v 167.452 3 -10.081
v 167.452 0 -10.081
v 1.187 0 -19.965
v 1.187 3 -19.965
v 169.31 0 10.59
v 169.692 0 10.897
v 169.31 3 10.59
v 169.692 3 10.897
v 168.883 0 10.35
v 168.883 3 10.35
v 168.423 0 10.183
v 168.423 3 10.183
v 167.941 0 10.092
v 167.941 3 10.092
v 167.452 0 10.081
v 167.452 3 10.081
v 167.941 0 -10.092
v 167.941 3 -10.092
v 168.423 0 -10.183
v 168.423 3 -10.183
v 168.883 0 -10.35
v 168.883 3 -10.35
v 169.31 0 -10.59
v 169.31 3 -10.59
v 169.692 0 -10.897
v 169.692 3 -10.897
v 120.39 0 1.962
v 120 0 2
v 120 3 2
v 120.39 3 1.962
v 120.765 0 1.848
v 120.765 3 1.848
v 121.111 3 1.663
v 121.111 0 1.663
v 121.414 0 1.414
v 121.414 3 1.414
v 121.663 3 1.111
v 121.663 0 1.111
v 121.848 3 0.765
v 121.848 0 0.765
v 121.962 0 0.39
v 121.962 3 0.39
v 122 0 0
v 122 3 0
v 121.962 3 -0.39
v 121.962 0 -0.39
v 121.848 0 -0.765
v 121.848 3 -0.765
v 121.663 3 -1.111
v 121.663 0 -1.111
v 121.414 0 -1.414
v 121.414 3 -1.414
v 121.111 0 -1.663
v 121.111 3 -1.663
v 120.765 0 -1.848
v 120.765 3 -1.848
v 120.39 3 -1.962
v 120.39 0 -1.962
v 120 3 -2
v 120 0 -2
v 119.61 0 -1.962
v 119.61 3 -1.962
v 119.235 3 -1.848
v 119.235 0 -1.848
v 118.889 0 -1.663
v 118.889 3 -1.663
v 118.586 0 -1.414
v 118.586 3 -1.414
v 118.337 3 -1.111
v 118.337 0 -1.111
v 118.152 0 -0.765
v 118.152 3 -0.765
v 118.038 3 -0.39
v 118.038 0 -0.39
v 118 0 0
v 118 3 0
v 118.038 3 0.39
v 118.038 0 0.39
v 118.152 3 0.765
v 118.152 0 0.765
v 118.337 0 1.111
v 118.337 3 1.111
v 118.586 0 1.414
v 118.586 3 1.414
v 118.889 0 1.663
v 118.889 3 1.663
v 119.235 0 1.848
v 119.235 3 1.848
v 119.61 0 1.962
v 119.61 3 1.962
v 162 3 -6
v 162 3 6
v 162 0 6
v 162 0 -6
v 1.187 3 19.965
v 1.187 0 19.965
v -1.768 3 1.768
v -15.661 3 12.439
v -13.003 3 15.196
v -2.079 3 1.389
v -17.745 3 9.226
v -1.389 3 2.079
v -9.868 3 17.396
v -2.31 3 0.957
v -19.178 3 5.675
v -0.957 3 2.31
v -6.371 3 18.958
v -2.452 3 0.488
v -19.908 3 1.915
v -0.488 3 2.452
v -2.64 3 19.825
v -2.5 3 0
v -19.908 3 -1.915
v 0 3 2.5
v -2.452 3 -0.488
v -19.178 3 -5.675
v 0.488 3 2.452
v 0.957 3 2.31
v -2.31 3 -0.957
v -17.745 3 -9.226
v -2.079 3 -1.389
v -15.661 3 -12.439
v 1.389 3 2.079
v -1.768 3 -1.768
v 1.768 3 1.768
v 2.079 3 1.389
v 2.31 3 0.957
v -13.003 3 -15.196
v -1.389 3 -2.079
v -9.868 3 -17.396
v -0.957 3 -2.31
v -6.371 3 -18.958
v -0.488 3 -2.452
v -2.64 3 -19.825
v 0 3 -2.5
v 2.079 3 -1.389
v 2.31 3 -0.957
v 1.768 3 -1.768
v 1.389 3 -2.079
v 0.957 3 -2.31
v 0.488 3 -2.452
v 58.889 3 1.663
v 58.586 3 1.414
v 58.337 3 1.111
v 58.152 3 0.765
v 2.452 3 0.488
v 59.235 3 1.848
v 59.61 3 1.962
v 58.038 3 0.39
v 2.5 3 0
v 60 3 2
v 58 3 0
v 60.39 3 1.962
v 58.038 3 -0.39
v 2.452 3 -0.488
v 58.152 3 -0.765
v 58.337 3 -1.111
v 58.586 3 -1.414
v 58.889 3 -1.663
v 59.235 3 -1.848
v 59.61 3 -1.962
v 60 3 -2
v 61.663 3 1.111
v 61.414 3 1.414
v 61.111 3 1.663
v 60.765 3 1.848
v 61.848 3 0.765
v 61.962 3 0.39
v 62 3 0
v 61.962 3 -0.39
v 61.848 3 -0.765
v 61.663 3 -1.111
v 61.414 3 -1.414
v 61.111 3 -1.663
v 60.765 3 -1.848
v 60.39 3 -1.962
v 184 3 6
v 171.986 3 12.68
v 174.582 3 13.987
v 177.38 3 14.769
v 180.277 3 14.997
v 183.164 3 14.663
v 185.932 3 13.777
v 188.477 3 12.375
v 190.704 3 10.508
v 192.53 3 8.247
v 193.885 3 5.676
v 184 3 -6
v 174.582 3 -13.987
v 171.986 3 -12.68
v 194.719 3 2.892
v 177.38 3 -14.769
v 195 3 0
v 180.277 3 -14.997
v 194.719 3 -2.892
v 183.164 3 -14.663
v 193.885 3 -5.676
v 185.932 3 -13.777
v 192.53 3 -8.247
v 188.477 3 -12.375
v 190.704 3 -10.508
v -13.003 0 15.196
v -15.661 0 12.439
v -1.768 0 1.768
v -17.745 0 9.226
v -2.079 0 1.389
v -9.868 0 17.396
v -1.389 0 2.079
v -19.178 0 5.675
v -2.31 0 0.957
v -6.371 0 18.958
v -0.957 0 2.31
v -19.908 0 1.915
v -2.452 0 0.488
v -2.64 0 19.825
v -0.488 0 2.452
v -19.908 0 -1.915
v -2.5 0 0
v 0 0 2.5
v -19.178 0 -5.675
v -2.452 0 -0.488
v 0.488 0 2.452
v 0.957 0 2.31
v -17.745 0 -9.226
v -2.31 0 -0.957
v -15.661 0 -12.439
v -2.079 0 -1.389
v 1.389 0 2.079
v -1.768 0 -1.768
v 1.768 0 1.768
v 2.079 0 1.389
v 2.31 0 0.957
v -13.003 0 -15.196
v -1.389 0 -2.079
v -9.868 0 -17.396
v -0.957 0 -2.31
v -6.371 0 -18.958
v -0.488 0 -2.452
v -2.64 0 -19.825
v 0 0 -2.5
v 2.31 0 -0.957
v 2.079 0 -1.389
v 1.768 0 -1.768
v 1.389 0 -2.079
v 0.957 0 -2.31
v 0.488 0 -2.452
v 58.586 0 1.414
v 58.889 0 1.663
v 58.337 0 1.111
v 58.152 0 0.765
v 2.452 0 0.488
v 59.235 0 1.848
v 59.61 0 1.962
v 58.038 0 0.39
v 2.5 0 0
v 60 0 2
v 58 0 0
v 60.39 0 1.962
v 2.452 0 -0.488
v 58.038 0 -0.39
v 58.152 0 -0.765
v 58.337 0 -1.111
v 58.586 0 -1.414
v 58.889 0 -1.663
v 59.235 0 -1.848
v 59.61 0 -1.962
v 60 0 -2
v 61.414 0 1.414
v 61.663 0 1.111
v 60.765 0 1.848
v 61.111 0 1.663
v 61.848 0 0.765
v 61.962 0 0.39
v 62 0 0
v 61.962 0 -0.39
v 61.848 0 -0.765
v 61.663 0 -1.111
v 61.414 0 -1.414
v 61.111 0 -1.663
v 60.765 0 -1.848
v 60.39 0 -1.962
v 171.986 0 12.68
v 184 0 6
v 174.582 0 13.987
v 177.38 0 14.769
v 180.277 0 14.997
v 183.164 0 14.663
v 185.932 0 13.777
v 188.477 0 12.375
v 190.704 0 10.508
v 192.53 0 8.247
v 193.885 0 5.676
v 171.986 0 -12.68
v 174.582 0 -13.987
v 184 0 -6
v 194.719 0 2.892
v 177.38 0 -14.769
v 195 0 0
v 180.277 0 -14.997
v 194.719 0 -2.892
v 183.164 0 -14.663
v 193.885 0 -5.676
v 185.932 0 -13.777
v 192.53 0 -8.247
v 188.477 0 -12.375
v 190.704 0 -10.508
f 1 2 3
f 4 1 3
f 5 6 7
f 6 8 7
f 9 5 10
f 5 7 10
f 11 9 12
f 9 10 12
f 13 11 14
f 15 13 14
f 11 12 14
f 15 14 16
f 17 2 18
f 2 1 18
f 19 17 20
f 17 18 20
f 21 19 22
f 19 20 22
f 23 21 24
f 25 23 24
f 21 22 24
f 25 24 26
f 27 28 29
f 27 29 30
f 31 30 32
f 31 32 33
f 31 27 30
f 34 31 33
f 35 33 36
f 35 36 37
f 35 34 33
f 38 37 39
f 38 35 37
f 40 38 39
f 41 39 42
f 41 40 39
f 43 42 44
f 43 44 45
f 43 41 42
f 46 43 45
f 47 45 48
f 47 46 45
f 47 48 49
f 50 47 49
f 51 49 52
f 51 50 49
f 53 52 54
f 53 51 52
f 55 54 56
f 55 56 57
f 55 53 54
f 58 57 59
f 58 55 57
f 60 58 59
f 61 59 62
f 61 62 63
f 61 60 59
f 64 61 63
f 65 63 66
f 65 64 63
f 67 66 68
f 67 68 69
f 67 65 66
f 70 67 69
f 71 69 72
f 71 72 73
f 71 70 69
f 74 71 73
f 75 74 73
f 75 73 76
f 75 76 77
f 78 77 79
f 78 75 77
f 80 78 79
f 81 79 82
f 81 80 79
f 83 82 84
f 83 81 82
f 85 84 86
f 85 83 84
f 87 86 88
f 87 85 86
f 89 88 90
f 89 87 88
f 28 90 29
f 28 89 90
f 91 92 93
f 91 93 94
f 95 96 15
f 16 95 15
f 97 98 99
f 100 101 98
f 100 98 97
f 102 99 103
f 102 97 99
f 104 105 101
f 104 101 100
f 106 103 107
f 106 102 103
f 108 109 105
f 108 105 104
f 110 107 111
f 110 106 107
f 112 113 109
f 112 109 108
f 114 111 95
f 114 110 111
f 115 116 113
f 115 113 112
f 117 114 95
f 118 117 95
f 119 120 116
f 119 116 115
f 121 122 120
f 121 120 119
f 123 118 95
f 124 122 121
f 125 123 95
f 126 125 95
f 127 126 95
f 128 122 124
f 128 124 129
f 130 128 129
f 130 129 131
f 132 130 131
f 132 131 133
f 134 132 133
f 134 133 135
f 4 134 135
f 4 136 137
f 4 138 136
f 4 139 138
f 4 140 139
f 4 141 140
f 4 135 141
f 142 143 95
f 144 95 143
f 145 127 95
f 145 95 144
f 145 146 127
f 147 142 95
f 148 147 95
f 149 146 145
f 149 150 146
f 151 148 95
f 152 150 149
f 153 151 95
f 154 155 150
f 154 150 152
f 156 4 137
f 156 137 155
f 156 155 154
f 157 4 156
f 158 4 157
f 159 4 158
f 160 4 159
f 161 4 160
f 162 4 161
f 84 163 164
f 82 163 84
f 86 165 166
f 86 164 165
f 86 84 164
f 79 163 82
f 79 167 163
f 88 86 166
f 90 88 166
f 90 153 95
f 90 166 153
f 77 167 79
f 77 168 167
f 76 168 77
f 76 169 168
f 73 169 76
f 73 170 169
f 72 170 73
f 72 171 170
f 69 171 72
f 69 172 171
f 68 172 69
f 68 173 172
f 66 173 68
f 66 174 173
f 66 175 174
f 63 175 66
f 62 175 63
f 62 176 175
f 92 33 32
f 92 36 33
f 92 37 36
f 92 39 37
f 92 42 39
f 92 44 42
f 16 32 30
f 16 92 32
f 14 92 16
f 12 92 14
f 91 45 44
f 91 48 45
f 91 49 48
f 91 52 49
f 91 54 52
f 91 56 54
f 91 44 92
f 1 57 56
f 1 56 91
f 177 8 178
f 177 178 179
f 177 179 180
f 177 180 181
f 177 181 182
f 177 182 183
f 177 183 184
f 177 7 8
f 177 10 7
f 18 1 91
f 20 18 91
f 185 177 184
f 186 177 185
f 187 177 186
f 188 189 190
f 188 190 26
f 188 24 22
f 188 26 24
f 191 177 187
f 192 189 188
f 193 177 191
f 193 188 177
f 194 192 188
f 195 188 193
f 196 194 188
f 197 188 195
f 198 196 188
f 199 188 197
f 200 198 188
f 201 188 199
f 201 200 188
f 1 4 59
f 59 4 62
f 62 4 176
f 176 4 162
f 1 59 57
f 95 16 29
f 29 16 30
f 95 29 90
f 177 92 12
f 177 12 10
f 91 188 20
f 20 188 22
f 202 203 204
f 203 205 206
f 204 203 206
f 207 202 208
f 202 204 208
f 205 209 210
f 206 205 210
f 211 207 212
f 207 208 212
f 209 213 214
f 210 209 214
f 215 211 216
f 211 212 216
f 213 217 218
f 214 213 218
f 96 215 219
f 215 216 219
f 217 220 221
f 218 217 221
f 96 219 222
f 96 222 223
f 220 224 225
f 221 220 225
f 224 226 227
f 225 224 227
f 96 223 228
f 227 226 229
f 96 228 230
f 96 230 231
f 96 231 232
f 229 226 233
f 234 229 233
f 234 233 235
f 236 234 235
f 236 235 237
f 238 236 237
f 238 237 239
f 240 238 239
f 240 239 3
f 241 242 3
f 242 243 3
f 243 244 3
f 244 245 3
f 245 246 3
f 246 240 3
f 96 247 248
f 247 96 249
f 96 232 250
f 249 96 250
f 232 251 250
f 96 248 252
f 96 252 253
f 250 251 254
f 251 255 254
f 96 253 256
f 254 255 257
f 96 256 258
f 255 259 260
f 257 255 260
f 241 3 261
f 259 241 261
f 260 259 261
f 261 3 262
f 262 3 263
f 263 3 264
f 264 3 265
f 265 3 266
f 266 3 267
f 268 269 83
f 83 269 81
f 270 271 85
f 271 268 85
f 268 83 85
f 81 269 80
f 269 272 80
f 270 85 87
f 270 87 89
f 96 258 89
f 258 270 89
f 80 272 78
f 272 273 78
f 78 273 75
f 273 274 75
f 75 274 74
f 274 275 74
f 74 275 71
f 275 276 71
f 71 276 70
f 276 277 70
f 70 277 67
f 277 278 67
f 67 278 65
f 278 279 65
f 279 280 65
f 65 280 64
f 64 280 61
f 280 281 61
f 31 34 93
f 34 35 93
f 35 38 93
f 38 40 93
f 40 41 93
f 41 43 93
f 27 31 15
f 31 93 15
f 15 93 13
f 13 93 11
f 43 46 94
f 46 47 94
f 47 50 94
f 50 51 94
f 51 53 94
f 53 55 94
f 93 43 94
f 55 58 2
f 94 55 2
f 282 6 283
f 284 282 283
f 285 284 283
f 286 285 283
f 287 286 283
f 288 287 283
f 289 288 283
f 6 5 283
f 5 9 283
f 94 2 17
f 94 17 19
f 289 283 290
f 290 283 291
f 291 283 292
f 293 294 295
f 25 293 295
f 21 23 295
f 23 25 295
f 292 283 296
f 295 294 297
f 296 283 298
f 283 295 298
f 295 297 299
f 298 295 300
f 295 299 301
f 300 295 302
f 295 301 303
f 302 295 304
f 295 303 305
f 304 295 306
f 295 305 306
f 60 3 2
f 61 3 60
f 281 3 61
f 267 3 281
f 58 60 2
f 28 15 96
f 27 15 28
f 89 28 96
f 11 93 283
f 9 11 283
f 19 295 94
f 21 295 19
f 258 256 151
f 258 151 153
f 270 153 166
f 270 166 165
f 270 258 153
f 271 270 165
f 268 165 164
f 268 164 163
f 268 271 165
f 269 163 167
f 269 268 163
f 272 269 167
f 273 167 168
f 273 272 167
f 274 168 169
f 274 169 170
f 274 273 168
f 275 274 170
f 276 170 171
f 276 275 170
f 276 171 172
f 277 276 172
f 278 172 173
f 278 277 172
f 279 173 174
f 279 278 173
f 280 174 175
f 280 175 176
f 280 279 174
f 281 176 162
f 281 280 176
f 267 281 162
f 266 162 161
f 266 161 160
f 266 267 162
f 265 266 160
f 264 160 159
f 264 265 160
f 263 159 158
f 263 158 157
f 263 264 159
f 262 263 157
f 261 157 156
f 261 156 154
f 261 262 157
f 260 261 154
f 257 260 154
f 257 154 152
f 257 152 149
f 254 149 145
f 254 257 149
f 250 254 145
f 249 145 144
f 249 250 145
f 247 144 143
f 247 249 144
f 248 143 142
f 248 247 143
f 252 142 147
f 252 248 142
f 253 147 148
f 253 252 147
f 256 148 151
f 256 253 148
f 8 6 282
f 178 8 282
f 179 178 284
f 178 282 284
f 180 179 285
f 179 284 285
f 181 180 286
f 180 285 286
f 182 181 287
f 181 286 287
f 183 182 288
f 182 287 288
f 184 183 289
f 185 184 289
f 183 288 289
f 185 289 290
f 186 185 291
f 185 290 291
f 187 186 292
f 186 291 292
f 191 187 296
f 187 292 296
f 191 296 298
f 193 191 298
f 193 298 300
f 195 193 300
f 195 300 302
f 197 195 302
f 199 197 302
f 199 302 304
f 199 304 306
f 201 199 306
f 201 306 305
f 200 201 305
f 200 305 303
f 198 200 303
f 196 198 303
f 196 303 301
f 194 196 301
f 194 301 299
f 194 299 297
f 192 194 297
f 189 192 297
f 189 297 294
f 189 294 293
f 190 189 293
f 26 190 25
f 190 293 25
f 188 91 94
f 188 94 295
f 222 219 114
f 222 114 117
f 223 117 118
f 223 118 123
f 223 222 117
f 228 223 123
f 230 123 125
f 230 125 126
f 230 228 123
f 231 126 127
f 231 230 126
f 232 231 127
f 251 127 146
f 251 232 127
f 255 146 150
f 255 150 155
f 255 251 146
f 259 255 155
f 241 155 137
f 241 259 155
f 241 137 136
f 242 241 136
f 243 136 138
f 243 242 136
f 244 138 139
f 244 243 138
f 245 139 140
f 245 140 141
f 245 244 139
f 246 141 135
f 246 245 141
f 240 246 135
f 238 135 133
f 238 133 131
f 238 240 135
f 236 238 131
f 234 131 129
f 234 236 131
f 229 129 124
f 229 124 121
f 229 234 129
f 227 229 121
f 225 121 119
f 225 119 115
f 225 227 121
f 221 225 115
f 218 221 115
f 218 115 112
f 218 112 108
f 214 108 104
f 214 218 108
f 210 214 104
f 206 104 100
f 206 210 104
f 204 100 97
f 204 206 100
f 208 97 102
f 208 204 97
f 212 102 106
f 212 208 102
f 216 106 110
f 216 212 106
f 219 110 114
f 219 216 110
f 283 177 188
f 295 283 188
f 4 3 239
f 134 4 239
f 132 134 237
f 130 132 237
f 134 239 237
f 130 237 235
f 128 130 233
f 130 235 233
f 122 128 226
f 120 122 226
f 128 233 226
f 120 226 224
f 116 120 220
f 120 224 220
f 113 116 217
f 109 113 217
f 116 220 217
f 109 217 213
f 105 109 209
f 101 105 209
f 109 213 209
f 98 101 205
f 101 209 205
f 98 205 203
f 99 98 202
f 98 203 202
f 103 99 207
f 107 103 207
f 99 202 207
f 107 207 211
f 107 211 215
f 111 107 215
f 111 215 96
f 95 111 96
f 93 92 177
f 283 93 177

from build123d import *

# Parameters (mm, degrees)
SKETCH1_R           = 2
SKETCH1_R_2         = 2.5
BOSS_EXTRUDE1_DEPTH = 3
FILLET2_R           = 3
FILLET3_R           = 3
SKETCH2_W           = 22
SKETCH2_H           = 12
CUT_EXTRUDE1_DEPTH  = 10


with BuildPart() as part:
    # Sketch1 → Boss-Extrude1 (new body)
    with BuildSketch(Plane(origin=(0, 0, 0), x_dir=(1, 0, 0), z_dir=(0, 1, 0))):
        with BuildLine():
            ThreePointArc((1.186783721, 19.964757559), (-20, 0), (1.186783721, -19.964757559))
            Line((1.186783721, -19.964757559), (168.819660113, -10))
            ThreePointArc((168.819660113, -10), (195, 0), (168.819660113, 10))
            Line((168.819660113, 10), (1.186783721, 19.964757559))
        make_face()
        with Locations(Location((60, 0, 0), (0, 0, 270))):
            Circle(SKETCH1_R, mode=Mode.SUBTRACT)
        with Locations(Location((0, 0, 0), (0, 0, 270))):
            Circle(SKETCH1_R_2, mode=Mode.SUBTRACT)
        with Locations(Location((120, 0, 0), (0, 0, 270))):
            Circle(SKETCH1_R, mode=Mode.SUBTRACT)
    extrude(amount=BOSS_EXTRUDE1_DEPTH)

    # Fillet2
    fillet2_edges = [part.edges().sort_by_distance(p)[0] for p in [
        (168.819660113, 1.5, -10),
    ]]
    fillet(fillet2_edges, radius=FILLET2_R)

    # Fillet3
    fillet3_edges = [part.edges().sort_by_distance(p)[0] for p in [
        (168.819660113, 1.5, 10),
    ]]
    fillet(fillet3_edges, radius=FILLET3_R)

    # Sketch2 → Cut-Extrude1 (cut)
    with BuildSketch(Plane(origin=(0, 3, 0), x_dir=(1, 0, 0), z_dir=(0, 1, 0))):
        with Locations((173, 0)):
            Rectangle(SKETCH2_W, SKETCH2_H)
    extrude(amount=-CUT_EXTRUDE1_DEPTH, mode=Mode.SUBTRACT)


solid = part.part
